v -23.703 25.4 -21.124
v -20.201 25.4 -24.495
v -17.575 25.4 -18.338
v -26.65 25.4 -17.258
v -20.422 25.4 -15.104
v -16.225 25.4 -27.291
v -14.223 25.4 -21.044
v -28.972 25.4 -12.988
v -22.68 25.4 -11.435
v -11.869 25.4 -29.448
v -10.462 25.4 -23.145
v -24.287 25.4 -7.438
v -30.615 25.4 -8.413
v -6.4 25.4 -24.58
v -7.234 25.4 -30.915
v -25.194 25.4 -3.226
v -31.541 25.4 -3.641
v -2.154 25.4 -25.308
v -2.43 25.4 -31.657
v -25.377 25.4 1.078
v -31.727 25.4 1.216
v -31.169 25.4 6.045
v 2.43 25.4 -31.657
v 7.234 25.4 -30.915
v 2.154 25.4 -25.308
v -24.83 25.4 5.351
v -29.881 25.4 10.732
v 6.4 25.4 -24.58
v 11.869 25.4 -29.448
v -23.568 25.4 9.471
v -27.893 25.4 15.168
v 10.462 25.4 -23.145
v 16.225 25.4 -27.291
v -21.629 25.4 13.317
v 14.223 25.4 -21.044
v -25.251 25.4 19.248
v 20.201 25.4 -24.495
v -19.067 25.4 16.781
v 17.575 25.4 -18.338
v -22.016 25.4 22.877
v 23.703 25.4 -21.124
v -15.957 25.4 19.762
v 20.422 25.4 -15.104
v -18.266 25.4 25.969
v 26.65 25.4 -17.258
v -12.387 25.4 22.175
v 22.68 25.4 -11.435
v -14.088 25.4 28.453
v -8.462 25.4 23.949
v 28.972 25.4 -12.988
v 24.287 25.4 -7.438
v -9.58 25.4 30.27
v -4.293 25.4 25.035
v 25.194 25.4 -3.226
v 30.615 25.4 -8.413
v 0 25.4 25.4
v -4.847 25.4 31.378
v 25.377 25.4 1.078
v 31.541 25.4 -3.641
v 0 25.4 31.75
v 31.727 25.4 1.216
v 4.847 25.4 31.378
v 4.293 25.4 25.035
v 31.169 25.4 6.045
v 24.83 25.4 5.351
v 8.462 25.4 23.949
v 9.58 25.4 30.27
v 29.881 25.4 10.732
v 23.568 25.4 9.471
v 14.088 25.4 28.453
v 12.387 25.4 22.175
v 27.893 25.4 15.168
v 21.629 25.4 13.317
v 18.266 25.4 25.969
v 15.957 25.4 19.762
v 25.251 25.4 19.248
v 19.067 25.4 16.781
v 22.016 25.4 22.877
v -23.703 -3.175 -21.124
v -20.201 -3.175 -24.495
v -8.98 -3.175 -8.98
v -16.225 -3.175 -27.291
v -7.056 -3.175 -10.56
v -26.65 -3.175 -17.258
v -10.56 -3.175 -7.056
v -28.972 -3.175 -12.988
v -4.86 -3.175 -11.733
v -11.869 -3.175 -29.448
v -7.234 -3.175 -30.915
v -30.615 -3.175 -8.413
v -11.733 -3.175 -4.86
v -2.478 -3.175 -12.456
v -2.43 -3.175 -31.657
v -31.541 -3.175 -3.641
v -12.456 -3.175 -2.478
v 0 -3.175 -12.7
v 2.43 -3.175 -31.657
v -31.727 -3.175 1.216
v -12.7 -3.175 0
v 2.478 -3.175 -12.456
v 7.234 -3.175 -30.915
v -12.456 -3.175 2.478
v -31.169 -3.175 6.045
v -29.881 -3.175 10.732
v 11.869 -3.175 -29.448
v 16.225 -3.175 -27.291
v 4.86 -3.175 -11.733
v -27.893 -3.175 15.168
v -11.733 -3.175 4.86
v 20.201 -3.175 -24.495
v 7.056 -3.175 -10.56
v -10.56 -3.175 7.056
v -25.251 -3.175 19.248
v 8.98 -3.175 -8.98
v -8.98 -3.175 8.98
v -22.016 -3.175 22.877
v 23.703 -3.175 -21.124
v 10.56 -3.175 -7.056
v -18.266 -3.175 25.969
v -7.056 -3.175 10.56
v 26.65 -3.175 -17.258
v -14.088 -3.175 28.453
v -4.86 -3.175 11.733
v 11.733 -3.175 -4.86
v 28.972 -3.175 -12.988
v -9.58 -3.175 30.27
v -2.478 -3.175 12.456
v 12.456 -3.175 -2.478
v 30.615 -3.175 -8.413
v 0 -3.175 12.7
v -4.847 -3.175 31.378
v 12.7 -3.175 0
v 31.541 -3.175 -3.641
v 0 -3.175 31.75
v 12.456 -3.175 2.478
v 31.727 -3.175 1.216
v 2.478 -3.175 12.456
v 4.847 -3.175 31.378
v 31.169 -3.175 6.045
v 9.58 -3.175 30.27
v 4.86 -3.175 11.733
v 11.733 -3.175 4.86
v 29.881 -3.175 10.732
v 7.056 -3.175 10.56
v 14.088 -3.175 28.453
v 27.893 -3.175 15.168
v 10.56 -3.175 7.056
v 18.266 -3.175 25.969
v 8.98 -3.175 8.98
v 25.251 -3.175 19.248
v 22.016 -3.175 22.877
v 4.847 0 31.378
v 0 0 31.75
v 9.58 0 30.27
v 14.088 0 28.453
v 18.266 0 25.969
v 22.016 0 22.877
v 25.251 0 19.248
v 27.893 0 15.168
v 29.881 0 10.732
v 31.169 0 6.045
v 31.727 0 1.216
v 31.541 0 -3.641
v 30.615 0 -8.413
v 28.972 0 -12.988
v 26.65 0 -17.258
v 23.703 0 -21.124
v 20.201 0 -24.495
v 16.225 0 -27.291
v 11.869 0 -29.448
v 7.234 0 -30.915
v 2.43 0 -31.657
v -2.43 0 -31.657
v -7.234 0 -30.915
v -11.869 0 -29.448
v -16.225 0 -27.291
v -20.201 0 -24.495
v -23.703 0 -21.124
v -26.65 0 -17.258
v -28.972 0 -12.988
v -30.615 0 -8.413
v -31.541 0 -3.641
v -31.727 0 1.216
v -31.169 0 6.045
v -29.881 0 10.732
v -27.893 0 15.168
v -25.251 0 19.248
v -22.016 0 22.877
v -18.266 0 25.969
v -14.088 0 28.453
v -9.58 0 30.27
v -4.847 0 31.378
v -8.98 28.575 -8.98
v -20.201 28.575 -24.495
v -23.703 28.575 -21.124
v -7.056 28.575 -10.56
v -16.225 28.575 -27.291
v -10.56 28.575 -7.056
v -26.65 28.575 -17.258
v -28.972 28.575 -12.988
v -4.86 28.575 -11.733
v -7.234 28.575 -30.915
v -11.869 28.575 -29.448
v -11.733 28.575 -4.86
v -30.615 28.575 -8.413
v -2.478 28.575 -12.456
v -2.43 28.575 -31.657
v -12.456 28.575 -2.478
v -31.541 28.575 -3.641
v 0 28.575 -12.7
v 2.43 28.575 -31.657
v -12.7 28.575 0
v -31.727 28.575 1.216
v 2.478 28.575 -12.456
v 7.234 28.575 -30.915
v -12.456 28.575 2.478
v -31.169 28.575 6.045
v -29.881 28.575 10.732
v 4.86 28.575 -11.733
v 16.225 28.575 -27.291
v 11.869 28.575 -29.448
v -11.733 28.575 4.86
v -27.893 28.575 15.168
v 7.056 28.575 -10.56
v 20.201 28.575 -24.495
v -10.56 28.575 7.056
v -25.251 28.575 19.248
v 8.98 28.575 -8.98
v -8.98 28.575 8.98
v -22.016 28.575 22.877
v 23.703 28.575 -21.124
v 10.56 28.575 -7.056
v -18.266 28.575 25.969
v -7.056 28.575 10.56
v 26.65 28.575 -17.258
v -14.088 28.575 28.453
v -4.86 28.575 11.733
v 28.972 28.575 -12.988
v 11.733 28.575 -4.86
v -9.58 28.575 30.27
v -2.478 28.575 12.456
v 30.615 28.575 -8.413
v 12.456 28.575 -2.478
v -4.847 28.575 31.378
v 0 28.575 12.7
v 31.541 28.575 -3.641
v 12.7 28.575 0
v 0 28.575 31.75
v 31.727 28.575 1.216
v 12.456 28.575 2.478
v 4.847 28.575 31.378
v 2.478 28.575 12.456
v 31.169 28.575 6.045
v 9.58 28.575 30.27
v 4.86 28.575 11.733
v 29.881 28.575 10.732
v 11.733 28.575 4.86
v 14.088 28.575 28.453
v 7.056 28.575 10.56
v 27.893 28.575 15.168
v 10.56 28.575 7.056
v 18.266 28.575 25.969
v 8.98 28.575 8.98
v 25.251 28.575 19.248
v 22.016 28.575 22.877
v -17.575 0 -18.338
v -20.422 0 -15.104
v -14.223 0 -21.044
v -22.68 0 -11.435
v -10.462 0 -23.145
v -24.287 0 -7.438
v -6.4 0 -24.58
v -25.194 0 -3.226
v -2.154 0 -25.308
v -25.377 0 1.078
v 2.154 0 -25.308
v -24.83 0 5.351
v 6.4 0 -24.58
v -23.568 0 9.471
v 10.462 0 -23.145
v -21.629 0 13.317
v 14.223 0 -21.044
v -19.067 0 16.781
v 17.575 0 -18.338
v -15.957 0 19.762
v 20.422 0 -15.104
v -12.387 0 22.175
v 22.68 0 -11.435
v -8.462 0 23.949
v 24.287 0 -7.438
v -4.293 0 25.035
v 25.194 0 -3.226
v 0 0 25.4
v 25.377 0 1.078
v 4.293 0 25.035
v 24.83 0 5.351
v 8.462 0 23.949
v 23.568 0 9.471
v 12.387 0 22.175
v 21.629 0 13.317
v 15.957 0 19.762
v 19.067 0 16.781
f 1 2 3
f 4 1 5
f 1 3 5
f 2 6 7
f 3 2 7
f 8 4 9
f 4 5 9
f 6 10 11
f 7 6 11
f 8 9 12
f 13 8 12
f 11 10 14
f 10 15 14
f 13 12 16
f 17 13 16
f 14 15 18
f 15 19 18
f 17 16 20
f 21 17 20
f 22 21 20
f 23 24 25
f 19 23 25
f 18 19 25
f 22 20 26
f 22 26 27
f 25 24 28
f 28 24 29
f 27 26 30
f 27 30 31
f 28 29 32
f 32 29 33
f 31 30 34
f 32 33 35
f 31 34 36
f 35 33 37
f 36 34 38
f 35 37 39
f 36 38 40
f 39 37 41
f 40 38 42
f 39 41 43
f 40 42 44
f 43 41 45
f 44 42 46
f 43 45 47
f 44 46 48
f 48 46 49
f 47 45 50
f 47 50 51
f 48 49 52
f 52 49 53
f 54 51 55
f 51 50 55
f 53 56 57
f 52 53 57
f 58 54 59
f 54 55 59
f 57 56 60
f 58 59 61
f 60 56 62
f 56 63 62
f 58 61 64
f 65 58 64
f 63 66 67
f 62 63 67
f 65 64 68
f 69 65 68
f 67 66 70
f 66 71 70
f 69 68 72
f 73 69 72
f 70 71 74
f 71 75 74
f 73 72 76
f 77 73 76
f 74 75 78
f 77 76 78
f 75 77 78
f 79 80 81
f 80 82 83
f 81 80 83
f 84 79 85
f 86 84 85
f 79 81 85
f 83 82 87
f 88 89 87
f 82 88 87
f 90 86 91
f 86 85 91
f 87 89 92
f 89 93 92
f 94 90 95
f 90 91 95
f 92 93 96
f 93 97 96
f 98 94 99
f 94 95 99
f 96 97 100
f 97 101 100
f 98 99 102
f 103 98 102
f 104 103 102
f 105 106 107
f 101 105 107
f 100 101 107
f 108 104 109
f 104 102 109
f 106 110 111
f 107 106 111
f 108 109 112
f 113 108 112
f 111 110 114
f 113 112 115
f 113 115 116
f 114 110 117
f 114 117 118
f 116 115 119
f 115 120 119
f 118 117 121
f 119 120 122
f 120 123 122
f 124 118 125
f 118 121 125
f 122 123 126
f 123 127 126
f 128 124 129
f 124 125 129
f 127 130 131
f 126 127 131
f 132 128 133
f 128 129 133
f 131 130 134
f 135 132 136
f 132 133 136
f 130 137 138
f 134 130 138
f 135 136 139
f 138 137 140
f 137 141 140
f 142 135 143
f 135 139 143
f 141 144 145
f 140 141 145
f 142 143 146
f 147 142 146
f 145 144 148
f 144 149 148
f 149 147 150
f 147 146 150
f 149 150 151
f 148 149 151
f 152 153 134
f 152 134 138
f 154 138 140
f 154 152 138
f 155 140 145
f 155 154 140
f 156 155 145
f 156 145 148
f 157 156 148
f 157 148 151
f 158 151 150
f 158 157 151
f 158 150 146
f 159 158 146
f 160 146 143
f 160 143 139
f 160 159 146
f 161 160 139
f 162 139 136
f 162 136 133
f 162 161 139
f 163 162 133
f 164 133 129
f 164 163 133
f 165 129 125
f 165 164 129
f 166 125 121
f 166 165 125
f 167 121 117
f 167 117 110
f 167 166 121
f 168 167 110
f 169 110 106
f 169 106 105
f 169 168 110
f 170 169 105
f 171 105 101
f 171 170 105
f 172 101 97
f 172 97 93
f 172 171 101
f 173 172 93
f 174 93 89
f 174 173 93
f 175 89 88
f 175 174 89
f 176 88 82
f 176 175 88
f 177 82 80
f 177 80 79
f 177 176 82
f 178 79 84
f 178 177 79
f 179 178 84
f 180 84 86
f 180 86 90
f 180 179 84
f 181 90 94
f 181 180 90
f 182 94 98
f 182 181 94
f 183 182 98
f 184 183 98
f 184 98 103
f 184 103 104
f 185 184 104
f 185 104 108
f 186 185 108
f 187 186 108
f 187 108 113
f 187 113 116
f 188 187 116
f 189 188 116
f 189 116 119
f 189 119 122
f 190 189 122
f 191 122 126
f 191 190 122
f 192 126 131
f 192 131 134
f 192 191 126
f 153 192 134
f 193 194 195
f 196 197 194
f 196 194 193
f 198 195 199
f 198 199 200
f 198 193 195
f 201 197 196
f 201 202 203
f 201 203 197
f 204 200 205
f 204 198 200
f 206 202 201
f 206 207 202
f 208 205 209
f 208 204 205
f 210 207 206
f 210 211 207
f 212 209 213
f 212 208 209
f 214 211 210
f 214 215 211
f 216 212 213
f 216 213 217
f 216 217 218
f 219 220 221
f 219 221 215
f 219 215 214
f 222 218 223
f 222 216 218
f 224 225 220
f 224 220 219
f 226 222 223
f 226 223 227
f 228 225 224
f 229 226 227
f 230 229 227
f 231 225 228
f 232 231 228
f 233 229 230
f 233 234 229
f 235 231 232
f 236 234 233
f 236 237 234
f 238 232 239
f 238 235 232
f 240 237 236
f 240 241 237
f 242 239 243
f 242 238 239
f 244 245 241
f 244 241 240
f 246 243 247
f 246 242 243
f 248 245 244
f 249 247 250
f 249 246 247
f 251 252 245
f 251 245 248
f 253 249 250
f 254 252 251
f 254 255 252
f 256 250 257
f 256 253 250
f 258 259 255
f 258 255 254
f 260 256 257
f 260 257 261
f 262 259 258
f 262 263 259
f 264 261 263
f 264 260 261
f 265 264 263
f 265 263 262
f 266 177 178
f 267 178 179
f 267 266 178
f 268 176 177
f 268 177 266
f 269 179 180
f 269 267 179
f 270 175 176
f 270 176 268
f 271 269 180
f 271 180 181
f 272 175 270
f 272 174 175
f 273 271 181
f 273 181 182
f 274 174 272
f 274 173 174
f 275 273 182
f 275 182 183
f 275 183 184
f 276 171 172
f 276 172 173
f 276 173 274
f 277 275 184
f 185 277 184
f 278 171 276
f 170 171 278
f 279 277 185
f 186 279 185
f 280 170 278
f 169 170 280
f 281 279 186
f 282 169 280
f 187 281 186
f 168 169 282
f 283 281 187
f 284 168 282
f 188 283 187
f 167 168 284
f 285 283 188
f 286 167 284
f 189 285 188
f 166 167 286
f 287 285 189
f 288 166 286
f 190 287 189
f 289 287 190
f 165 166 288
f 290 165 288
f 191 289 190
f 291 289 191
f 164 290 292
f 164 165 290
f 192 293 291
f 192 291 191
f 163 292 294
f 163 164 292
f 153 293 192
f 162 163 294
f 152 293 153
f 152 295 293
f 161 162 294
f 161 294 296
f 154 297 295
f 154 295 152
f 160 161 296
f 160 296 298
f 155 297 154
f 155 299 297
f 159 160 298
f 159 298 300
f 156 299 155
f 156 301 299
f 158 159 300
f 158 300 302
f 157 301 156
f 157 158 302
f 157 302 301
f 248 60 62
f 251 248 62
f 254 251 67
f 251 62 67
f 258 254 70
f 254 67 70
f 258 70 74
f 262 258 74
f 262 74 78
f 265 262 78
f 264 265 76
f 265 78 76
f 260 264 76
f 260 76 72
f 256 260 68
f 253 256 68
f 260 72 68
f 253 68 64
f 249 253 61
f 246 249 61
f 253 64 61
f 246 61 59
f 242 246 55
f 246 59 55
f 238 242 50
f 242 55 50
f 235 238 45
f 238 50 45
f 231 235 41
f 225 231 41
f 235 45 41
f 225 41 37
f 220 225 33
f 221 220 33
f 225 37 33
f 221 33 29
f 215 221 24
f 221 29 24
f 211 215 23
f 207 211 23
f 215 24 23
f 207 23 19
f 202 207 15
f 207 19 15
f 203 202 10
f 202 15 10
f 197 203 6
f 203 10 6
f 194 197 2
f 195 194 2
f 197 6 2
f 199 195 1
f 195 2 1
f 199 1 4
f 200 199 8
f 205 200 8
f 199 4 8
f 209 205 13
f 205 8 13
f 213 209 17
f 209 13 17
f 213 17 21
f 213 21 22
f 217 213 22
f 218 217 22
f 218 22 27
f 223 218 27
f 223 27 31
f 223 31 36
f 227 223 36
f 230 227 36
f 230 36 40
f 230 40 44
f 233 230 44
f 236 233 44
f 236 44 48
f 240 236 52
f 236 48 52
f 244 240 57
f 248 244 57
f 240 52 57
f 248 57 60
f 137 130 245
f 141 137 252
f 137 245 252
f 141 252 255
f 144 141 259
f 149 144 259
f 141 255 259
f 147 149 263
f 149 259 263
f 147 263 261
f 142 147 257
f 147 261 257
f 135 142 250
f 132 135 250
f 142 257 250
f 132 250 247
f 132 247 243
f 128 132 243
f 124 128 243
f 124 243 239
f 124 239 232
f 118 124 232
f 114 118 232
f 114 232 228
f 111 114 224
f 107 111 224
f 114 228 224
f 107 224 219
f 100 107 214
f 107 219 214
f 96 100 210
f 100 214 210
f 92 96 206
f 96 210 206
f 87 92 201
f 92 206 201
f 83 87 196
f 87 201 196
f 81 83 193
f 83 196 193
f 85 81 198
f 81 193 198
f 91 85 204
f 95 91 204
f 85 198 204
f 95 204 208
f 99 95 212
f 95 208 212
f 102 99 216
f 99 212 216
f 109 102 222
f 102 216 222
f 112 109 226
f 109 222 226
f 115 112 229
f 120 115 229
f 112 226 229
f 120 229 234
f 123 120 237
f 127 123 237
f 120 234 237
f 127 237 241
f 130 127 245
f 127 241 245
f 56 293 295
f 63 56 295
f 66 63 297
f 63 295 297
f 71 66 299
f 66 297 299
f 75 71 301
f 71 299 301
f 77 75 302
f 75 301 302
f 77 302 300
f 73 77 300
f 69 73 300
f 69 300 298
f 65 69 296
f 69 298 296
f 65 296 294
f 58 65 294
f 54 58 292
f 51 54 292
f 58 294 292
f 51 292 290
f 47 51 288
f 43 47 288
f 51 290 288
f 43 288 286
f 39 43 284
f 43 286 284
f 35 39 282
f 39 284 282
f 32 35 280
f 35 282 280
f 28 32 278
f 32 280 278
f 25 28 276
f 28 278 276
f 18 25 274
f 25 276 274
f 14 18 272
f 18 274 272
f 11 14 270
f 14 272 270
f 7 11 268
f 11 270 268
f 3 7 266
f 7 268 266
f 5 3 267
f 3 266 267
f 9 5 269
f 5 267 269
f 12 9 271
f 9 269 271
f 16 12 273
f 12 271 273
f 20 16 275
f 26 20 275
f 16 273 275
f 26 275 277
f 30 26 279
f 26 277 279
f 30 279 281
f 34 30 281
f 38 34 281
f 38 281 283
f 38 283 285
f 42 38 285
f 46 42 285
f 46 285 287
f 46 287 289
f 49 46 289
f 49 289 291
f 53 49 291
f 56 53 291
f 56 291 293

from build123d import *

# Parameters (mm, degrees)
SKETCH1_R           = 25.4
SKETCH1_R_2         = 12.7
BOSS_EXTRUDE1_DEPTH = 25.4
SKETCH4_R           = 31.75
SKETCH4_R_2         = 12.7
BOSS_EXTRUDE3_DEPTH = 3.175


with BuildPart() as part:
    # Sketch1 → Boss-Extrude1 (new body)
    with BuildSketch(Plane(origin=(0, 0, 0), x_dir=(1, 0, 0), z_dir=(0, 1, 0))):
        with Locations(Location((0, 0, 0), (0, 0, 270))):
            Circle(SKETCH1_R)
        with Locations(Location((0, 0, 0), (0, 0, 270))):
            Circle(SKETCH1_R_2, mode=Mode.SUBTRACT)
    extrude(amount=BOSS_EXTRUDE1_DEPTH)

    # Sketch4 → Boss-Extrude3 (add)
    with BuildSketch(Plane(origin=(0, 25.4, 0), x_dir=(1, 0, 0), z_dir=(0, 1, 0))):
        with Locations(Location((0, 0, 0), (0, 0, 270))):
            Circle(SKETCH4_R)
        with Locations(Location((0, 0, 0), (0, 0, 270))):
            Circle(SKETCH4_R_2, mode=Mode.SUBTRACT)
    boss_extrude3 = extrude(amount=BOSS_EXTRUDE3_DEPTH)

    # Mirror2: Boss-Extrude3 across plane
    add(boss_extrude3.mirror(Plane.ZX.offset(12.7)))


solid = part.part
